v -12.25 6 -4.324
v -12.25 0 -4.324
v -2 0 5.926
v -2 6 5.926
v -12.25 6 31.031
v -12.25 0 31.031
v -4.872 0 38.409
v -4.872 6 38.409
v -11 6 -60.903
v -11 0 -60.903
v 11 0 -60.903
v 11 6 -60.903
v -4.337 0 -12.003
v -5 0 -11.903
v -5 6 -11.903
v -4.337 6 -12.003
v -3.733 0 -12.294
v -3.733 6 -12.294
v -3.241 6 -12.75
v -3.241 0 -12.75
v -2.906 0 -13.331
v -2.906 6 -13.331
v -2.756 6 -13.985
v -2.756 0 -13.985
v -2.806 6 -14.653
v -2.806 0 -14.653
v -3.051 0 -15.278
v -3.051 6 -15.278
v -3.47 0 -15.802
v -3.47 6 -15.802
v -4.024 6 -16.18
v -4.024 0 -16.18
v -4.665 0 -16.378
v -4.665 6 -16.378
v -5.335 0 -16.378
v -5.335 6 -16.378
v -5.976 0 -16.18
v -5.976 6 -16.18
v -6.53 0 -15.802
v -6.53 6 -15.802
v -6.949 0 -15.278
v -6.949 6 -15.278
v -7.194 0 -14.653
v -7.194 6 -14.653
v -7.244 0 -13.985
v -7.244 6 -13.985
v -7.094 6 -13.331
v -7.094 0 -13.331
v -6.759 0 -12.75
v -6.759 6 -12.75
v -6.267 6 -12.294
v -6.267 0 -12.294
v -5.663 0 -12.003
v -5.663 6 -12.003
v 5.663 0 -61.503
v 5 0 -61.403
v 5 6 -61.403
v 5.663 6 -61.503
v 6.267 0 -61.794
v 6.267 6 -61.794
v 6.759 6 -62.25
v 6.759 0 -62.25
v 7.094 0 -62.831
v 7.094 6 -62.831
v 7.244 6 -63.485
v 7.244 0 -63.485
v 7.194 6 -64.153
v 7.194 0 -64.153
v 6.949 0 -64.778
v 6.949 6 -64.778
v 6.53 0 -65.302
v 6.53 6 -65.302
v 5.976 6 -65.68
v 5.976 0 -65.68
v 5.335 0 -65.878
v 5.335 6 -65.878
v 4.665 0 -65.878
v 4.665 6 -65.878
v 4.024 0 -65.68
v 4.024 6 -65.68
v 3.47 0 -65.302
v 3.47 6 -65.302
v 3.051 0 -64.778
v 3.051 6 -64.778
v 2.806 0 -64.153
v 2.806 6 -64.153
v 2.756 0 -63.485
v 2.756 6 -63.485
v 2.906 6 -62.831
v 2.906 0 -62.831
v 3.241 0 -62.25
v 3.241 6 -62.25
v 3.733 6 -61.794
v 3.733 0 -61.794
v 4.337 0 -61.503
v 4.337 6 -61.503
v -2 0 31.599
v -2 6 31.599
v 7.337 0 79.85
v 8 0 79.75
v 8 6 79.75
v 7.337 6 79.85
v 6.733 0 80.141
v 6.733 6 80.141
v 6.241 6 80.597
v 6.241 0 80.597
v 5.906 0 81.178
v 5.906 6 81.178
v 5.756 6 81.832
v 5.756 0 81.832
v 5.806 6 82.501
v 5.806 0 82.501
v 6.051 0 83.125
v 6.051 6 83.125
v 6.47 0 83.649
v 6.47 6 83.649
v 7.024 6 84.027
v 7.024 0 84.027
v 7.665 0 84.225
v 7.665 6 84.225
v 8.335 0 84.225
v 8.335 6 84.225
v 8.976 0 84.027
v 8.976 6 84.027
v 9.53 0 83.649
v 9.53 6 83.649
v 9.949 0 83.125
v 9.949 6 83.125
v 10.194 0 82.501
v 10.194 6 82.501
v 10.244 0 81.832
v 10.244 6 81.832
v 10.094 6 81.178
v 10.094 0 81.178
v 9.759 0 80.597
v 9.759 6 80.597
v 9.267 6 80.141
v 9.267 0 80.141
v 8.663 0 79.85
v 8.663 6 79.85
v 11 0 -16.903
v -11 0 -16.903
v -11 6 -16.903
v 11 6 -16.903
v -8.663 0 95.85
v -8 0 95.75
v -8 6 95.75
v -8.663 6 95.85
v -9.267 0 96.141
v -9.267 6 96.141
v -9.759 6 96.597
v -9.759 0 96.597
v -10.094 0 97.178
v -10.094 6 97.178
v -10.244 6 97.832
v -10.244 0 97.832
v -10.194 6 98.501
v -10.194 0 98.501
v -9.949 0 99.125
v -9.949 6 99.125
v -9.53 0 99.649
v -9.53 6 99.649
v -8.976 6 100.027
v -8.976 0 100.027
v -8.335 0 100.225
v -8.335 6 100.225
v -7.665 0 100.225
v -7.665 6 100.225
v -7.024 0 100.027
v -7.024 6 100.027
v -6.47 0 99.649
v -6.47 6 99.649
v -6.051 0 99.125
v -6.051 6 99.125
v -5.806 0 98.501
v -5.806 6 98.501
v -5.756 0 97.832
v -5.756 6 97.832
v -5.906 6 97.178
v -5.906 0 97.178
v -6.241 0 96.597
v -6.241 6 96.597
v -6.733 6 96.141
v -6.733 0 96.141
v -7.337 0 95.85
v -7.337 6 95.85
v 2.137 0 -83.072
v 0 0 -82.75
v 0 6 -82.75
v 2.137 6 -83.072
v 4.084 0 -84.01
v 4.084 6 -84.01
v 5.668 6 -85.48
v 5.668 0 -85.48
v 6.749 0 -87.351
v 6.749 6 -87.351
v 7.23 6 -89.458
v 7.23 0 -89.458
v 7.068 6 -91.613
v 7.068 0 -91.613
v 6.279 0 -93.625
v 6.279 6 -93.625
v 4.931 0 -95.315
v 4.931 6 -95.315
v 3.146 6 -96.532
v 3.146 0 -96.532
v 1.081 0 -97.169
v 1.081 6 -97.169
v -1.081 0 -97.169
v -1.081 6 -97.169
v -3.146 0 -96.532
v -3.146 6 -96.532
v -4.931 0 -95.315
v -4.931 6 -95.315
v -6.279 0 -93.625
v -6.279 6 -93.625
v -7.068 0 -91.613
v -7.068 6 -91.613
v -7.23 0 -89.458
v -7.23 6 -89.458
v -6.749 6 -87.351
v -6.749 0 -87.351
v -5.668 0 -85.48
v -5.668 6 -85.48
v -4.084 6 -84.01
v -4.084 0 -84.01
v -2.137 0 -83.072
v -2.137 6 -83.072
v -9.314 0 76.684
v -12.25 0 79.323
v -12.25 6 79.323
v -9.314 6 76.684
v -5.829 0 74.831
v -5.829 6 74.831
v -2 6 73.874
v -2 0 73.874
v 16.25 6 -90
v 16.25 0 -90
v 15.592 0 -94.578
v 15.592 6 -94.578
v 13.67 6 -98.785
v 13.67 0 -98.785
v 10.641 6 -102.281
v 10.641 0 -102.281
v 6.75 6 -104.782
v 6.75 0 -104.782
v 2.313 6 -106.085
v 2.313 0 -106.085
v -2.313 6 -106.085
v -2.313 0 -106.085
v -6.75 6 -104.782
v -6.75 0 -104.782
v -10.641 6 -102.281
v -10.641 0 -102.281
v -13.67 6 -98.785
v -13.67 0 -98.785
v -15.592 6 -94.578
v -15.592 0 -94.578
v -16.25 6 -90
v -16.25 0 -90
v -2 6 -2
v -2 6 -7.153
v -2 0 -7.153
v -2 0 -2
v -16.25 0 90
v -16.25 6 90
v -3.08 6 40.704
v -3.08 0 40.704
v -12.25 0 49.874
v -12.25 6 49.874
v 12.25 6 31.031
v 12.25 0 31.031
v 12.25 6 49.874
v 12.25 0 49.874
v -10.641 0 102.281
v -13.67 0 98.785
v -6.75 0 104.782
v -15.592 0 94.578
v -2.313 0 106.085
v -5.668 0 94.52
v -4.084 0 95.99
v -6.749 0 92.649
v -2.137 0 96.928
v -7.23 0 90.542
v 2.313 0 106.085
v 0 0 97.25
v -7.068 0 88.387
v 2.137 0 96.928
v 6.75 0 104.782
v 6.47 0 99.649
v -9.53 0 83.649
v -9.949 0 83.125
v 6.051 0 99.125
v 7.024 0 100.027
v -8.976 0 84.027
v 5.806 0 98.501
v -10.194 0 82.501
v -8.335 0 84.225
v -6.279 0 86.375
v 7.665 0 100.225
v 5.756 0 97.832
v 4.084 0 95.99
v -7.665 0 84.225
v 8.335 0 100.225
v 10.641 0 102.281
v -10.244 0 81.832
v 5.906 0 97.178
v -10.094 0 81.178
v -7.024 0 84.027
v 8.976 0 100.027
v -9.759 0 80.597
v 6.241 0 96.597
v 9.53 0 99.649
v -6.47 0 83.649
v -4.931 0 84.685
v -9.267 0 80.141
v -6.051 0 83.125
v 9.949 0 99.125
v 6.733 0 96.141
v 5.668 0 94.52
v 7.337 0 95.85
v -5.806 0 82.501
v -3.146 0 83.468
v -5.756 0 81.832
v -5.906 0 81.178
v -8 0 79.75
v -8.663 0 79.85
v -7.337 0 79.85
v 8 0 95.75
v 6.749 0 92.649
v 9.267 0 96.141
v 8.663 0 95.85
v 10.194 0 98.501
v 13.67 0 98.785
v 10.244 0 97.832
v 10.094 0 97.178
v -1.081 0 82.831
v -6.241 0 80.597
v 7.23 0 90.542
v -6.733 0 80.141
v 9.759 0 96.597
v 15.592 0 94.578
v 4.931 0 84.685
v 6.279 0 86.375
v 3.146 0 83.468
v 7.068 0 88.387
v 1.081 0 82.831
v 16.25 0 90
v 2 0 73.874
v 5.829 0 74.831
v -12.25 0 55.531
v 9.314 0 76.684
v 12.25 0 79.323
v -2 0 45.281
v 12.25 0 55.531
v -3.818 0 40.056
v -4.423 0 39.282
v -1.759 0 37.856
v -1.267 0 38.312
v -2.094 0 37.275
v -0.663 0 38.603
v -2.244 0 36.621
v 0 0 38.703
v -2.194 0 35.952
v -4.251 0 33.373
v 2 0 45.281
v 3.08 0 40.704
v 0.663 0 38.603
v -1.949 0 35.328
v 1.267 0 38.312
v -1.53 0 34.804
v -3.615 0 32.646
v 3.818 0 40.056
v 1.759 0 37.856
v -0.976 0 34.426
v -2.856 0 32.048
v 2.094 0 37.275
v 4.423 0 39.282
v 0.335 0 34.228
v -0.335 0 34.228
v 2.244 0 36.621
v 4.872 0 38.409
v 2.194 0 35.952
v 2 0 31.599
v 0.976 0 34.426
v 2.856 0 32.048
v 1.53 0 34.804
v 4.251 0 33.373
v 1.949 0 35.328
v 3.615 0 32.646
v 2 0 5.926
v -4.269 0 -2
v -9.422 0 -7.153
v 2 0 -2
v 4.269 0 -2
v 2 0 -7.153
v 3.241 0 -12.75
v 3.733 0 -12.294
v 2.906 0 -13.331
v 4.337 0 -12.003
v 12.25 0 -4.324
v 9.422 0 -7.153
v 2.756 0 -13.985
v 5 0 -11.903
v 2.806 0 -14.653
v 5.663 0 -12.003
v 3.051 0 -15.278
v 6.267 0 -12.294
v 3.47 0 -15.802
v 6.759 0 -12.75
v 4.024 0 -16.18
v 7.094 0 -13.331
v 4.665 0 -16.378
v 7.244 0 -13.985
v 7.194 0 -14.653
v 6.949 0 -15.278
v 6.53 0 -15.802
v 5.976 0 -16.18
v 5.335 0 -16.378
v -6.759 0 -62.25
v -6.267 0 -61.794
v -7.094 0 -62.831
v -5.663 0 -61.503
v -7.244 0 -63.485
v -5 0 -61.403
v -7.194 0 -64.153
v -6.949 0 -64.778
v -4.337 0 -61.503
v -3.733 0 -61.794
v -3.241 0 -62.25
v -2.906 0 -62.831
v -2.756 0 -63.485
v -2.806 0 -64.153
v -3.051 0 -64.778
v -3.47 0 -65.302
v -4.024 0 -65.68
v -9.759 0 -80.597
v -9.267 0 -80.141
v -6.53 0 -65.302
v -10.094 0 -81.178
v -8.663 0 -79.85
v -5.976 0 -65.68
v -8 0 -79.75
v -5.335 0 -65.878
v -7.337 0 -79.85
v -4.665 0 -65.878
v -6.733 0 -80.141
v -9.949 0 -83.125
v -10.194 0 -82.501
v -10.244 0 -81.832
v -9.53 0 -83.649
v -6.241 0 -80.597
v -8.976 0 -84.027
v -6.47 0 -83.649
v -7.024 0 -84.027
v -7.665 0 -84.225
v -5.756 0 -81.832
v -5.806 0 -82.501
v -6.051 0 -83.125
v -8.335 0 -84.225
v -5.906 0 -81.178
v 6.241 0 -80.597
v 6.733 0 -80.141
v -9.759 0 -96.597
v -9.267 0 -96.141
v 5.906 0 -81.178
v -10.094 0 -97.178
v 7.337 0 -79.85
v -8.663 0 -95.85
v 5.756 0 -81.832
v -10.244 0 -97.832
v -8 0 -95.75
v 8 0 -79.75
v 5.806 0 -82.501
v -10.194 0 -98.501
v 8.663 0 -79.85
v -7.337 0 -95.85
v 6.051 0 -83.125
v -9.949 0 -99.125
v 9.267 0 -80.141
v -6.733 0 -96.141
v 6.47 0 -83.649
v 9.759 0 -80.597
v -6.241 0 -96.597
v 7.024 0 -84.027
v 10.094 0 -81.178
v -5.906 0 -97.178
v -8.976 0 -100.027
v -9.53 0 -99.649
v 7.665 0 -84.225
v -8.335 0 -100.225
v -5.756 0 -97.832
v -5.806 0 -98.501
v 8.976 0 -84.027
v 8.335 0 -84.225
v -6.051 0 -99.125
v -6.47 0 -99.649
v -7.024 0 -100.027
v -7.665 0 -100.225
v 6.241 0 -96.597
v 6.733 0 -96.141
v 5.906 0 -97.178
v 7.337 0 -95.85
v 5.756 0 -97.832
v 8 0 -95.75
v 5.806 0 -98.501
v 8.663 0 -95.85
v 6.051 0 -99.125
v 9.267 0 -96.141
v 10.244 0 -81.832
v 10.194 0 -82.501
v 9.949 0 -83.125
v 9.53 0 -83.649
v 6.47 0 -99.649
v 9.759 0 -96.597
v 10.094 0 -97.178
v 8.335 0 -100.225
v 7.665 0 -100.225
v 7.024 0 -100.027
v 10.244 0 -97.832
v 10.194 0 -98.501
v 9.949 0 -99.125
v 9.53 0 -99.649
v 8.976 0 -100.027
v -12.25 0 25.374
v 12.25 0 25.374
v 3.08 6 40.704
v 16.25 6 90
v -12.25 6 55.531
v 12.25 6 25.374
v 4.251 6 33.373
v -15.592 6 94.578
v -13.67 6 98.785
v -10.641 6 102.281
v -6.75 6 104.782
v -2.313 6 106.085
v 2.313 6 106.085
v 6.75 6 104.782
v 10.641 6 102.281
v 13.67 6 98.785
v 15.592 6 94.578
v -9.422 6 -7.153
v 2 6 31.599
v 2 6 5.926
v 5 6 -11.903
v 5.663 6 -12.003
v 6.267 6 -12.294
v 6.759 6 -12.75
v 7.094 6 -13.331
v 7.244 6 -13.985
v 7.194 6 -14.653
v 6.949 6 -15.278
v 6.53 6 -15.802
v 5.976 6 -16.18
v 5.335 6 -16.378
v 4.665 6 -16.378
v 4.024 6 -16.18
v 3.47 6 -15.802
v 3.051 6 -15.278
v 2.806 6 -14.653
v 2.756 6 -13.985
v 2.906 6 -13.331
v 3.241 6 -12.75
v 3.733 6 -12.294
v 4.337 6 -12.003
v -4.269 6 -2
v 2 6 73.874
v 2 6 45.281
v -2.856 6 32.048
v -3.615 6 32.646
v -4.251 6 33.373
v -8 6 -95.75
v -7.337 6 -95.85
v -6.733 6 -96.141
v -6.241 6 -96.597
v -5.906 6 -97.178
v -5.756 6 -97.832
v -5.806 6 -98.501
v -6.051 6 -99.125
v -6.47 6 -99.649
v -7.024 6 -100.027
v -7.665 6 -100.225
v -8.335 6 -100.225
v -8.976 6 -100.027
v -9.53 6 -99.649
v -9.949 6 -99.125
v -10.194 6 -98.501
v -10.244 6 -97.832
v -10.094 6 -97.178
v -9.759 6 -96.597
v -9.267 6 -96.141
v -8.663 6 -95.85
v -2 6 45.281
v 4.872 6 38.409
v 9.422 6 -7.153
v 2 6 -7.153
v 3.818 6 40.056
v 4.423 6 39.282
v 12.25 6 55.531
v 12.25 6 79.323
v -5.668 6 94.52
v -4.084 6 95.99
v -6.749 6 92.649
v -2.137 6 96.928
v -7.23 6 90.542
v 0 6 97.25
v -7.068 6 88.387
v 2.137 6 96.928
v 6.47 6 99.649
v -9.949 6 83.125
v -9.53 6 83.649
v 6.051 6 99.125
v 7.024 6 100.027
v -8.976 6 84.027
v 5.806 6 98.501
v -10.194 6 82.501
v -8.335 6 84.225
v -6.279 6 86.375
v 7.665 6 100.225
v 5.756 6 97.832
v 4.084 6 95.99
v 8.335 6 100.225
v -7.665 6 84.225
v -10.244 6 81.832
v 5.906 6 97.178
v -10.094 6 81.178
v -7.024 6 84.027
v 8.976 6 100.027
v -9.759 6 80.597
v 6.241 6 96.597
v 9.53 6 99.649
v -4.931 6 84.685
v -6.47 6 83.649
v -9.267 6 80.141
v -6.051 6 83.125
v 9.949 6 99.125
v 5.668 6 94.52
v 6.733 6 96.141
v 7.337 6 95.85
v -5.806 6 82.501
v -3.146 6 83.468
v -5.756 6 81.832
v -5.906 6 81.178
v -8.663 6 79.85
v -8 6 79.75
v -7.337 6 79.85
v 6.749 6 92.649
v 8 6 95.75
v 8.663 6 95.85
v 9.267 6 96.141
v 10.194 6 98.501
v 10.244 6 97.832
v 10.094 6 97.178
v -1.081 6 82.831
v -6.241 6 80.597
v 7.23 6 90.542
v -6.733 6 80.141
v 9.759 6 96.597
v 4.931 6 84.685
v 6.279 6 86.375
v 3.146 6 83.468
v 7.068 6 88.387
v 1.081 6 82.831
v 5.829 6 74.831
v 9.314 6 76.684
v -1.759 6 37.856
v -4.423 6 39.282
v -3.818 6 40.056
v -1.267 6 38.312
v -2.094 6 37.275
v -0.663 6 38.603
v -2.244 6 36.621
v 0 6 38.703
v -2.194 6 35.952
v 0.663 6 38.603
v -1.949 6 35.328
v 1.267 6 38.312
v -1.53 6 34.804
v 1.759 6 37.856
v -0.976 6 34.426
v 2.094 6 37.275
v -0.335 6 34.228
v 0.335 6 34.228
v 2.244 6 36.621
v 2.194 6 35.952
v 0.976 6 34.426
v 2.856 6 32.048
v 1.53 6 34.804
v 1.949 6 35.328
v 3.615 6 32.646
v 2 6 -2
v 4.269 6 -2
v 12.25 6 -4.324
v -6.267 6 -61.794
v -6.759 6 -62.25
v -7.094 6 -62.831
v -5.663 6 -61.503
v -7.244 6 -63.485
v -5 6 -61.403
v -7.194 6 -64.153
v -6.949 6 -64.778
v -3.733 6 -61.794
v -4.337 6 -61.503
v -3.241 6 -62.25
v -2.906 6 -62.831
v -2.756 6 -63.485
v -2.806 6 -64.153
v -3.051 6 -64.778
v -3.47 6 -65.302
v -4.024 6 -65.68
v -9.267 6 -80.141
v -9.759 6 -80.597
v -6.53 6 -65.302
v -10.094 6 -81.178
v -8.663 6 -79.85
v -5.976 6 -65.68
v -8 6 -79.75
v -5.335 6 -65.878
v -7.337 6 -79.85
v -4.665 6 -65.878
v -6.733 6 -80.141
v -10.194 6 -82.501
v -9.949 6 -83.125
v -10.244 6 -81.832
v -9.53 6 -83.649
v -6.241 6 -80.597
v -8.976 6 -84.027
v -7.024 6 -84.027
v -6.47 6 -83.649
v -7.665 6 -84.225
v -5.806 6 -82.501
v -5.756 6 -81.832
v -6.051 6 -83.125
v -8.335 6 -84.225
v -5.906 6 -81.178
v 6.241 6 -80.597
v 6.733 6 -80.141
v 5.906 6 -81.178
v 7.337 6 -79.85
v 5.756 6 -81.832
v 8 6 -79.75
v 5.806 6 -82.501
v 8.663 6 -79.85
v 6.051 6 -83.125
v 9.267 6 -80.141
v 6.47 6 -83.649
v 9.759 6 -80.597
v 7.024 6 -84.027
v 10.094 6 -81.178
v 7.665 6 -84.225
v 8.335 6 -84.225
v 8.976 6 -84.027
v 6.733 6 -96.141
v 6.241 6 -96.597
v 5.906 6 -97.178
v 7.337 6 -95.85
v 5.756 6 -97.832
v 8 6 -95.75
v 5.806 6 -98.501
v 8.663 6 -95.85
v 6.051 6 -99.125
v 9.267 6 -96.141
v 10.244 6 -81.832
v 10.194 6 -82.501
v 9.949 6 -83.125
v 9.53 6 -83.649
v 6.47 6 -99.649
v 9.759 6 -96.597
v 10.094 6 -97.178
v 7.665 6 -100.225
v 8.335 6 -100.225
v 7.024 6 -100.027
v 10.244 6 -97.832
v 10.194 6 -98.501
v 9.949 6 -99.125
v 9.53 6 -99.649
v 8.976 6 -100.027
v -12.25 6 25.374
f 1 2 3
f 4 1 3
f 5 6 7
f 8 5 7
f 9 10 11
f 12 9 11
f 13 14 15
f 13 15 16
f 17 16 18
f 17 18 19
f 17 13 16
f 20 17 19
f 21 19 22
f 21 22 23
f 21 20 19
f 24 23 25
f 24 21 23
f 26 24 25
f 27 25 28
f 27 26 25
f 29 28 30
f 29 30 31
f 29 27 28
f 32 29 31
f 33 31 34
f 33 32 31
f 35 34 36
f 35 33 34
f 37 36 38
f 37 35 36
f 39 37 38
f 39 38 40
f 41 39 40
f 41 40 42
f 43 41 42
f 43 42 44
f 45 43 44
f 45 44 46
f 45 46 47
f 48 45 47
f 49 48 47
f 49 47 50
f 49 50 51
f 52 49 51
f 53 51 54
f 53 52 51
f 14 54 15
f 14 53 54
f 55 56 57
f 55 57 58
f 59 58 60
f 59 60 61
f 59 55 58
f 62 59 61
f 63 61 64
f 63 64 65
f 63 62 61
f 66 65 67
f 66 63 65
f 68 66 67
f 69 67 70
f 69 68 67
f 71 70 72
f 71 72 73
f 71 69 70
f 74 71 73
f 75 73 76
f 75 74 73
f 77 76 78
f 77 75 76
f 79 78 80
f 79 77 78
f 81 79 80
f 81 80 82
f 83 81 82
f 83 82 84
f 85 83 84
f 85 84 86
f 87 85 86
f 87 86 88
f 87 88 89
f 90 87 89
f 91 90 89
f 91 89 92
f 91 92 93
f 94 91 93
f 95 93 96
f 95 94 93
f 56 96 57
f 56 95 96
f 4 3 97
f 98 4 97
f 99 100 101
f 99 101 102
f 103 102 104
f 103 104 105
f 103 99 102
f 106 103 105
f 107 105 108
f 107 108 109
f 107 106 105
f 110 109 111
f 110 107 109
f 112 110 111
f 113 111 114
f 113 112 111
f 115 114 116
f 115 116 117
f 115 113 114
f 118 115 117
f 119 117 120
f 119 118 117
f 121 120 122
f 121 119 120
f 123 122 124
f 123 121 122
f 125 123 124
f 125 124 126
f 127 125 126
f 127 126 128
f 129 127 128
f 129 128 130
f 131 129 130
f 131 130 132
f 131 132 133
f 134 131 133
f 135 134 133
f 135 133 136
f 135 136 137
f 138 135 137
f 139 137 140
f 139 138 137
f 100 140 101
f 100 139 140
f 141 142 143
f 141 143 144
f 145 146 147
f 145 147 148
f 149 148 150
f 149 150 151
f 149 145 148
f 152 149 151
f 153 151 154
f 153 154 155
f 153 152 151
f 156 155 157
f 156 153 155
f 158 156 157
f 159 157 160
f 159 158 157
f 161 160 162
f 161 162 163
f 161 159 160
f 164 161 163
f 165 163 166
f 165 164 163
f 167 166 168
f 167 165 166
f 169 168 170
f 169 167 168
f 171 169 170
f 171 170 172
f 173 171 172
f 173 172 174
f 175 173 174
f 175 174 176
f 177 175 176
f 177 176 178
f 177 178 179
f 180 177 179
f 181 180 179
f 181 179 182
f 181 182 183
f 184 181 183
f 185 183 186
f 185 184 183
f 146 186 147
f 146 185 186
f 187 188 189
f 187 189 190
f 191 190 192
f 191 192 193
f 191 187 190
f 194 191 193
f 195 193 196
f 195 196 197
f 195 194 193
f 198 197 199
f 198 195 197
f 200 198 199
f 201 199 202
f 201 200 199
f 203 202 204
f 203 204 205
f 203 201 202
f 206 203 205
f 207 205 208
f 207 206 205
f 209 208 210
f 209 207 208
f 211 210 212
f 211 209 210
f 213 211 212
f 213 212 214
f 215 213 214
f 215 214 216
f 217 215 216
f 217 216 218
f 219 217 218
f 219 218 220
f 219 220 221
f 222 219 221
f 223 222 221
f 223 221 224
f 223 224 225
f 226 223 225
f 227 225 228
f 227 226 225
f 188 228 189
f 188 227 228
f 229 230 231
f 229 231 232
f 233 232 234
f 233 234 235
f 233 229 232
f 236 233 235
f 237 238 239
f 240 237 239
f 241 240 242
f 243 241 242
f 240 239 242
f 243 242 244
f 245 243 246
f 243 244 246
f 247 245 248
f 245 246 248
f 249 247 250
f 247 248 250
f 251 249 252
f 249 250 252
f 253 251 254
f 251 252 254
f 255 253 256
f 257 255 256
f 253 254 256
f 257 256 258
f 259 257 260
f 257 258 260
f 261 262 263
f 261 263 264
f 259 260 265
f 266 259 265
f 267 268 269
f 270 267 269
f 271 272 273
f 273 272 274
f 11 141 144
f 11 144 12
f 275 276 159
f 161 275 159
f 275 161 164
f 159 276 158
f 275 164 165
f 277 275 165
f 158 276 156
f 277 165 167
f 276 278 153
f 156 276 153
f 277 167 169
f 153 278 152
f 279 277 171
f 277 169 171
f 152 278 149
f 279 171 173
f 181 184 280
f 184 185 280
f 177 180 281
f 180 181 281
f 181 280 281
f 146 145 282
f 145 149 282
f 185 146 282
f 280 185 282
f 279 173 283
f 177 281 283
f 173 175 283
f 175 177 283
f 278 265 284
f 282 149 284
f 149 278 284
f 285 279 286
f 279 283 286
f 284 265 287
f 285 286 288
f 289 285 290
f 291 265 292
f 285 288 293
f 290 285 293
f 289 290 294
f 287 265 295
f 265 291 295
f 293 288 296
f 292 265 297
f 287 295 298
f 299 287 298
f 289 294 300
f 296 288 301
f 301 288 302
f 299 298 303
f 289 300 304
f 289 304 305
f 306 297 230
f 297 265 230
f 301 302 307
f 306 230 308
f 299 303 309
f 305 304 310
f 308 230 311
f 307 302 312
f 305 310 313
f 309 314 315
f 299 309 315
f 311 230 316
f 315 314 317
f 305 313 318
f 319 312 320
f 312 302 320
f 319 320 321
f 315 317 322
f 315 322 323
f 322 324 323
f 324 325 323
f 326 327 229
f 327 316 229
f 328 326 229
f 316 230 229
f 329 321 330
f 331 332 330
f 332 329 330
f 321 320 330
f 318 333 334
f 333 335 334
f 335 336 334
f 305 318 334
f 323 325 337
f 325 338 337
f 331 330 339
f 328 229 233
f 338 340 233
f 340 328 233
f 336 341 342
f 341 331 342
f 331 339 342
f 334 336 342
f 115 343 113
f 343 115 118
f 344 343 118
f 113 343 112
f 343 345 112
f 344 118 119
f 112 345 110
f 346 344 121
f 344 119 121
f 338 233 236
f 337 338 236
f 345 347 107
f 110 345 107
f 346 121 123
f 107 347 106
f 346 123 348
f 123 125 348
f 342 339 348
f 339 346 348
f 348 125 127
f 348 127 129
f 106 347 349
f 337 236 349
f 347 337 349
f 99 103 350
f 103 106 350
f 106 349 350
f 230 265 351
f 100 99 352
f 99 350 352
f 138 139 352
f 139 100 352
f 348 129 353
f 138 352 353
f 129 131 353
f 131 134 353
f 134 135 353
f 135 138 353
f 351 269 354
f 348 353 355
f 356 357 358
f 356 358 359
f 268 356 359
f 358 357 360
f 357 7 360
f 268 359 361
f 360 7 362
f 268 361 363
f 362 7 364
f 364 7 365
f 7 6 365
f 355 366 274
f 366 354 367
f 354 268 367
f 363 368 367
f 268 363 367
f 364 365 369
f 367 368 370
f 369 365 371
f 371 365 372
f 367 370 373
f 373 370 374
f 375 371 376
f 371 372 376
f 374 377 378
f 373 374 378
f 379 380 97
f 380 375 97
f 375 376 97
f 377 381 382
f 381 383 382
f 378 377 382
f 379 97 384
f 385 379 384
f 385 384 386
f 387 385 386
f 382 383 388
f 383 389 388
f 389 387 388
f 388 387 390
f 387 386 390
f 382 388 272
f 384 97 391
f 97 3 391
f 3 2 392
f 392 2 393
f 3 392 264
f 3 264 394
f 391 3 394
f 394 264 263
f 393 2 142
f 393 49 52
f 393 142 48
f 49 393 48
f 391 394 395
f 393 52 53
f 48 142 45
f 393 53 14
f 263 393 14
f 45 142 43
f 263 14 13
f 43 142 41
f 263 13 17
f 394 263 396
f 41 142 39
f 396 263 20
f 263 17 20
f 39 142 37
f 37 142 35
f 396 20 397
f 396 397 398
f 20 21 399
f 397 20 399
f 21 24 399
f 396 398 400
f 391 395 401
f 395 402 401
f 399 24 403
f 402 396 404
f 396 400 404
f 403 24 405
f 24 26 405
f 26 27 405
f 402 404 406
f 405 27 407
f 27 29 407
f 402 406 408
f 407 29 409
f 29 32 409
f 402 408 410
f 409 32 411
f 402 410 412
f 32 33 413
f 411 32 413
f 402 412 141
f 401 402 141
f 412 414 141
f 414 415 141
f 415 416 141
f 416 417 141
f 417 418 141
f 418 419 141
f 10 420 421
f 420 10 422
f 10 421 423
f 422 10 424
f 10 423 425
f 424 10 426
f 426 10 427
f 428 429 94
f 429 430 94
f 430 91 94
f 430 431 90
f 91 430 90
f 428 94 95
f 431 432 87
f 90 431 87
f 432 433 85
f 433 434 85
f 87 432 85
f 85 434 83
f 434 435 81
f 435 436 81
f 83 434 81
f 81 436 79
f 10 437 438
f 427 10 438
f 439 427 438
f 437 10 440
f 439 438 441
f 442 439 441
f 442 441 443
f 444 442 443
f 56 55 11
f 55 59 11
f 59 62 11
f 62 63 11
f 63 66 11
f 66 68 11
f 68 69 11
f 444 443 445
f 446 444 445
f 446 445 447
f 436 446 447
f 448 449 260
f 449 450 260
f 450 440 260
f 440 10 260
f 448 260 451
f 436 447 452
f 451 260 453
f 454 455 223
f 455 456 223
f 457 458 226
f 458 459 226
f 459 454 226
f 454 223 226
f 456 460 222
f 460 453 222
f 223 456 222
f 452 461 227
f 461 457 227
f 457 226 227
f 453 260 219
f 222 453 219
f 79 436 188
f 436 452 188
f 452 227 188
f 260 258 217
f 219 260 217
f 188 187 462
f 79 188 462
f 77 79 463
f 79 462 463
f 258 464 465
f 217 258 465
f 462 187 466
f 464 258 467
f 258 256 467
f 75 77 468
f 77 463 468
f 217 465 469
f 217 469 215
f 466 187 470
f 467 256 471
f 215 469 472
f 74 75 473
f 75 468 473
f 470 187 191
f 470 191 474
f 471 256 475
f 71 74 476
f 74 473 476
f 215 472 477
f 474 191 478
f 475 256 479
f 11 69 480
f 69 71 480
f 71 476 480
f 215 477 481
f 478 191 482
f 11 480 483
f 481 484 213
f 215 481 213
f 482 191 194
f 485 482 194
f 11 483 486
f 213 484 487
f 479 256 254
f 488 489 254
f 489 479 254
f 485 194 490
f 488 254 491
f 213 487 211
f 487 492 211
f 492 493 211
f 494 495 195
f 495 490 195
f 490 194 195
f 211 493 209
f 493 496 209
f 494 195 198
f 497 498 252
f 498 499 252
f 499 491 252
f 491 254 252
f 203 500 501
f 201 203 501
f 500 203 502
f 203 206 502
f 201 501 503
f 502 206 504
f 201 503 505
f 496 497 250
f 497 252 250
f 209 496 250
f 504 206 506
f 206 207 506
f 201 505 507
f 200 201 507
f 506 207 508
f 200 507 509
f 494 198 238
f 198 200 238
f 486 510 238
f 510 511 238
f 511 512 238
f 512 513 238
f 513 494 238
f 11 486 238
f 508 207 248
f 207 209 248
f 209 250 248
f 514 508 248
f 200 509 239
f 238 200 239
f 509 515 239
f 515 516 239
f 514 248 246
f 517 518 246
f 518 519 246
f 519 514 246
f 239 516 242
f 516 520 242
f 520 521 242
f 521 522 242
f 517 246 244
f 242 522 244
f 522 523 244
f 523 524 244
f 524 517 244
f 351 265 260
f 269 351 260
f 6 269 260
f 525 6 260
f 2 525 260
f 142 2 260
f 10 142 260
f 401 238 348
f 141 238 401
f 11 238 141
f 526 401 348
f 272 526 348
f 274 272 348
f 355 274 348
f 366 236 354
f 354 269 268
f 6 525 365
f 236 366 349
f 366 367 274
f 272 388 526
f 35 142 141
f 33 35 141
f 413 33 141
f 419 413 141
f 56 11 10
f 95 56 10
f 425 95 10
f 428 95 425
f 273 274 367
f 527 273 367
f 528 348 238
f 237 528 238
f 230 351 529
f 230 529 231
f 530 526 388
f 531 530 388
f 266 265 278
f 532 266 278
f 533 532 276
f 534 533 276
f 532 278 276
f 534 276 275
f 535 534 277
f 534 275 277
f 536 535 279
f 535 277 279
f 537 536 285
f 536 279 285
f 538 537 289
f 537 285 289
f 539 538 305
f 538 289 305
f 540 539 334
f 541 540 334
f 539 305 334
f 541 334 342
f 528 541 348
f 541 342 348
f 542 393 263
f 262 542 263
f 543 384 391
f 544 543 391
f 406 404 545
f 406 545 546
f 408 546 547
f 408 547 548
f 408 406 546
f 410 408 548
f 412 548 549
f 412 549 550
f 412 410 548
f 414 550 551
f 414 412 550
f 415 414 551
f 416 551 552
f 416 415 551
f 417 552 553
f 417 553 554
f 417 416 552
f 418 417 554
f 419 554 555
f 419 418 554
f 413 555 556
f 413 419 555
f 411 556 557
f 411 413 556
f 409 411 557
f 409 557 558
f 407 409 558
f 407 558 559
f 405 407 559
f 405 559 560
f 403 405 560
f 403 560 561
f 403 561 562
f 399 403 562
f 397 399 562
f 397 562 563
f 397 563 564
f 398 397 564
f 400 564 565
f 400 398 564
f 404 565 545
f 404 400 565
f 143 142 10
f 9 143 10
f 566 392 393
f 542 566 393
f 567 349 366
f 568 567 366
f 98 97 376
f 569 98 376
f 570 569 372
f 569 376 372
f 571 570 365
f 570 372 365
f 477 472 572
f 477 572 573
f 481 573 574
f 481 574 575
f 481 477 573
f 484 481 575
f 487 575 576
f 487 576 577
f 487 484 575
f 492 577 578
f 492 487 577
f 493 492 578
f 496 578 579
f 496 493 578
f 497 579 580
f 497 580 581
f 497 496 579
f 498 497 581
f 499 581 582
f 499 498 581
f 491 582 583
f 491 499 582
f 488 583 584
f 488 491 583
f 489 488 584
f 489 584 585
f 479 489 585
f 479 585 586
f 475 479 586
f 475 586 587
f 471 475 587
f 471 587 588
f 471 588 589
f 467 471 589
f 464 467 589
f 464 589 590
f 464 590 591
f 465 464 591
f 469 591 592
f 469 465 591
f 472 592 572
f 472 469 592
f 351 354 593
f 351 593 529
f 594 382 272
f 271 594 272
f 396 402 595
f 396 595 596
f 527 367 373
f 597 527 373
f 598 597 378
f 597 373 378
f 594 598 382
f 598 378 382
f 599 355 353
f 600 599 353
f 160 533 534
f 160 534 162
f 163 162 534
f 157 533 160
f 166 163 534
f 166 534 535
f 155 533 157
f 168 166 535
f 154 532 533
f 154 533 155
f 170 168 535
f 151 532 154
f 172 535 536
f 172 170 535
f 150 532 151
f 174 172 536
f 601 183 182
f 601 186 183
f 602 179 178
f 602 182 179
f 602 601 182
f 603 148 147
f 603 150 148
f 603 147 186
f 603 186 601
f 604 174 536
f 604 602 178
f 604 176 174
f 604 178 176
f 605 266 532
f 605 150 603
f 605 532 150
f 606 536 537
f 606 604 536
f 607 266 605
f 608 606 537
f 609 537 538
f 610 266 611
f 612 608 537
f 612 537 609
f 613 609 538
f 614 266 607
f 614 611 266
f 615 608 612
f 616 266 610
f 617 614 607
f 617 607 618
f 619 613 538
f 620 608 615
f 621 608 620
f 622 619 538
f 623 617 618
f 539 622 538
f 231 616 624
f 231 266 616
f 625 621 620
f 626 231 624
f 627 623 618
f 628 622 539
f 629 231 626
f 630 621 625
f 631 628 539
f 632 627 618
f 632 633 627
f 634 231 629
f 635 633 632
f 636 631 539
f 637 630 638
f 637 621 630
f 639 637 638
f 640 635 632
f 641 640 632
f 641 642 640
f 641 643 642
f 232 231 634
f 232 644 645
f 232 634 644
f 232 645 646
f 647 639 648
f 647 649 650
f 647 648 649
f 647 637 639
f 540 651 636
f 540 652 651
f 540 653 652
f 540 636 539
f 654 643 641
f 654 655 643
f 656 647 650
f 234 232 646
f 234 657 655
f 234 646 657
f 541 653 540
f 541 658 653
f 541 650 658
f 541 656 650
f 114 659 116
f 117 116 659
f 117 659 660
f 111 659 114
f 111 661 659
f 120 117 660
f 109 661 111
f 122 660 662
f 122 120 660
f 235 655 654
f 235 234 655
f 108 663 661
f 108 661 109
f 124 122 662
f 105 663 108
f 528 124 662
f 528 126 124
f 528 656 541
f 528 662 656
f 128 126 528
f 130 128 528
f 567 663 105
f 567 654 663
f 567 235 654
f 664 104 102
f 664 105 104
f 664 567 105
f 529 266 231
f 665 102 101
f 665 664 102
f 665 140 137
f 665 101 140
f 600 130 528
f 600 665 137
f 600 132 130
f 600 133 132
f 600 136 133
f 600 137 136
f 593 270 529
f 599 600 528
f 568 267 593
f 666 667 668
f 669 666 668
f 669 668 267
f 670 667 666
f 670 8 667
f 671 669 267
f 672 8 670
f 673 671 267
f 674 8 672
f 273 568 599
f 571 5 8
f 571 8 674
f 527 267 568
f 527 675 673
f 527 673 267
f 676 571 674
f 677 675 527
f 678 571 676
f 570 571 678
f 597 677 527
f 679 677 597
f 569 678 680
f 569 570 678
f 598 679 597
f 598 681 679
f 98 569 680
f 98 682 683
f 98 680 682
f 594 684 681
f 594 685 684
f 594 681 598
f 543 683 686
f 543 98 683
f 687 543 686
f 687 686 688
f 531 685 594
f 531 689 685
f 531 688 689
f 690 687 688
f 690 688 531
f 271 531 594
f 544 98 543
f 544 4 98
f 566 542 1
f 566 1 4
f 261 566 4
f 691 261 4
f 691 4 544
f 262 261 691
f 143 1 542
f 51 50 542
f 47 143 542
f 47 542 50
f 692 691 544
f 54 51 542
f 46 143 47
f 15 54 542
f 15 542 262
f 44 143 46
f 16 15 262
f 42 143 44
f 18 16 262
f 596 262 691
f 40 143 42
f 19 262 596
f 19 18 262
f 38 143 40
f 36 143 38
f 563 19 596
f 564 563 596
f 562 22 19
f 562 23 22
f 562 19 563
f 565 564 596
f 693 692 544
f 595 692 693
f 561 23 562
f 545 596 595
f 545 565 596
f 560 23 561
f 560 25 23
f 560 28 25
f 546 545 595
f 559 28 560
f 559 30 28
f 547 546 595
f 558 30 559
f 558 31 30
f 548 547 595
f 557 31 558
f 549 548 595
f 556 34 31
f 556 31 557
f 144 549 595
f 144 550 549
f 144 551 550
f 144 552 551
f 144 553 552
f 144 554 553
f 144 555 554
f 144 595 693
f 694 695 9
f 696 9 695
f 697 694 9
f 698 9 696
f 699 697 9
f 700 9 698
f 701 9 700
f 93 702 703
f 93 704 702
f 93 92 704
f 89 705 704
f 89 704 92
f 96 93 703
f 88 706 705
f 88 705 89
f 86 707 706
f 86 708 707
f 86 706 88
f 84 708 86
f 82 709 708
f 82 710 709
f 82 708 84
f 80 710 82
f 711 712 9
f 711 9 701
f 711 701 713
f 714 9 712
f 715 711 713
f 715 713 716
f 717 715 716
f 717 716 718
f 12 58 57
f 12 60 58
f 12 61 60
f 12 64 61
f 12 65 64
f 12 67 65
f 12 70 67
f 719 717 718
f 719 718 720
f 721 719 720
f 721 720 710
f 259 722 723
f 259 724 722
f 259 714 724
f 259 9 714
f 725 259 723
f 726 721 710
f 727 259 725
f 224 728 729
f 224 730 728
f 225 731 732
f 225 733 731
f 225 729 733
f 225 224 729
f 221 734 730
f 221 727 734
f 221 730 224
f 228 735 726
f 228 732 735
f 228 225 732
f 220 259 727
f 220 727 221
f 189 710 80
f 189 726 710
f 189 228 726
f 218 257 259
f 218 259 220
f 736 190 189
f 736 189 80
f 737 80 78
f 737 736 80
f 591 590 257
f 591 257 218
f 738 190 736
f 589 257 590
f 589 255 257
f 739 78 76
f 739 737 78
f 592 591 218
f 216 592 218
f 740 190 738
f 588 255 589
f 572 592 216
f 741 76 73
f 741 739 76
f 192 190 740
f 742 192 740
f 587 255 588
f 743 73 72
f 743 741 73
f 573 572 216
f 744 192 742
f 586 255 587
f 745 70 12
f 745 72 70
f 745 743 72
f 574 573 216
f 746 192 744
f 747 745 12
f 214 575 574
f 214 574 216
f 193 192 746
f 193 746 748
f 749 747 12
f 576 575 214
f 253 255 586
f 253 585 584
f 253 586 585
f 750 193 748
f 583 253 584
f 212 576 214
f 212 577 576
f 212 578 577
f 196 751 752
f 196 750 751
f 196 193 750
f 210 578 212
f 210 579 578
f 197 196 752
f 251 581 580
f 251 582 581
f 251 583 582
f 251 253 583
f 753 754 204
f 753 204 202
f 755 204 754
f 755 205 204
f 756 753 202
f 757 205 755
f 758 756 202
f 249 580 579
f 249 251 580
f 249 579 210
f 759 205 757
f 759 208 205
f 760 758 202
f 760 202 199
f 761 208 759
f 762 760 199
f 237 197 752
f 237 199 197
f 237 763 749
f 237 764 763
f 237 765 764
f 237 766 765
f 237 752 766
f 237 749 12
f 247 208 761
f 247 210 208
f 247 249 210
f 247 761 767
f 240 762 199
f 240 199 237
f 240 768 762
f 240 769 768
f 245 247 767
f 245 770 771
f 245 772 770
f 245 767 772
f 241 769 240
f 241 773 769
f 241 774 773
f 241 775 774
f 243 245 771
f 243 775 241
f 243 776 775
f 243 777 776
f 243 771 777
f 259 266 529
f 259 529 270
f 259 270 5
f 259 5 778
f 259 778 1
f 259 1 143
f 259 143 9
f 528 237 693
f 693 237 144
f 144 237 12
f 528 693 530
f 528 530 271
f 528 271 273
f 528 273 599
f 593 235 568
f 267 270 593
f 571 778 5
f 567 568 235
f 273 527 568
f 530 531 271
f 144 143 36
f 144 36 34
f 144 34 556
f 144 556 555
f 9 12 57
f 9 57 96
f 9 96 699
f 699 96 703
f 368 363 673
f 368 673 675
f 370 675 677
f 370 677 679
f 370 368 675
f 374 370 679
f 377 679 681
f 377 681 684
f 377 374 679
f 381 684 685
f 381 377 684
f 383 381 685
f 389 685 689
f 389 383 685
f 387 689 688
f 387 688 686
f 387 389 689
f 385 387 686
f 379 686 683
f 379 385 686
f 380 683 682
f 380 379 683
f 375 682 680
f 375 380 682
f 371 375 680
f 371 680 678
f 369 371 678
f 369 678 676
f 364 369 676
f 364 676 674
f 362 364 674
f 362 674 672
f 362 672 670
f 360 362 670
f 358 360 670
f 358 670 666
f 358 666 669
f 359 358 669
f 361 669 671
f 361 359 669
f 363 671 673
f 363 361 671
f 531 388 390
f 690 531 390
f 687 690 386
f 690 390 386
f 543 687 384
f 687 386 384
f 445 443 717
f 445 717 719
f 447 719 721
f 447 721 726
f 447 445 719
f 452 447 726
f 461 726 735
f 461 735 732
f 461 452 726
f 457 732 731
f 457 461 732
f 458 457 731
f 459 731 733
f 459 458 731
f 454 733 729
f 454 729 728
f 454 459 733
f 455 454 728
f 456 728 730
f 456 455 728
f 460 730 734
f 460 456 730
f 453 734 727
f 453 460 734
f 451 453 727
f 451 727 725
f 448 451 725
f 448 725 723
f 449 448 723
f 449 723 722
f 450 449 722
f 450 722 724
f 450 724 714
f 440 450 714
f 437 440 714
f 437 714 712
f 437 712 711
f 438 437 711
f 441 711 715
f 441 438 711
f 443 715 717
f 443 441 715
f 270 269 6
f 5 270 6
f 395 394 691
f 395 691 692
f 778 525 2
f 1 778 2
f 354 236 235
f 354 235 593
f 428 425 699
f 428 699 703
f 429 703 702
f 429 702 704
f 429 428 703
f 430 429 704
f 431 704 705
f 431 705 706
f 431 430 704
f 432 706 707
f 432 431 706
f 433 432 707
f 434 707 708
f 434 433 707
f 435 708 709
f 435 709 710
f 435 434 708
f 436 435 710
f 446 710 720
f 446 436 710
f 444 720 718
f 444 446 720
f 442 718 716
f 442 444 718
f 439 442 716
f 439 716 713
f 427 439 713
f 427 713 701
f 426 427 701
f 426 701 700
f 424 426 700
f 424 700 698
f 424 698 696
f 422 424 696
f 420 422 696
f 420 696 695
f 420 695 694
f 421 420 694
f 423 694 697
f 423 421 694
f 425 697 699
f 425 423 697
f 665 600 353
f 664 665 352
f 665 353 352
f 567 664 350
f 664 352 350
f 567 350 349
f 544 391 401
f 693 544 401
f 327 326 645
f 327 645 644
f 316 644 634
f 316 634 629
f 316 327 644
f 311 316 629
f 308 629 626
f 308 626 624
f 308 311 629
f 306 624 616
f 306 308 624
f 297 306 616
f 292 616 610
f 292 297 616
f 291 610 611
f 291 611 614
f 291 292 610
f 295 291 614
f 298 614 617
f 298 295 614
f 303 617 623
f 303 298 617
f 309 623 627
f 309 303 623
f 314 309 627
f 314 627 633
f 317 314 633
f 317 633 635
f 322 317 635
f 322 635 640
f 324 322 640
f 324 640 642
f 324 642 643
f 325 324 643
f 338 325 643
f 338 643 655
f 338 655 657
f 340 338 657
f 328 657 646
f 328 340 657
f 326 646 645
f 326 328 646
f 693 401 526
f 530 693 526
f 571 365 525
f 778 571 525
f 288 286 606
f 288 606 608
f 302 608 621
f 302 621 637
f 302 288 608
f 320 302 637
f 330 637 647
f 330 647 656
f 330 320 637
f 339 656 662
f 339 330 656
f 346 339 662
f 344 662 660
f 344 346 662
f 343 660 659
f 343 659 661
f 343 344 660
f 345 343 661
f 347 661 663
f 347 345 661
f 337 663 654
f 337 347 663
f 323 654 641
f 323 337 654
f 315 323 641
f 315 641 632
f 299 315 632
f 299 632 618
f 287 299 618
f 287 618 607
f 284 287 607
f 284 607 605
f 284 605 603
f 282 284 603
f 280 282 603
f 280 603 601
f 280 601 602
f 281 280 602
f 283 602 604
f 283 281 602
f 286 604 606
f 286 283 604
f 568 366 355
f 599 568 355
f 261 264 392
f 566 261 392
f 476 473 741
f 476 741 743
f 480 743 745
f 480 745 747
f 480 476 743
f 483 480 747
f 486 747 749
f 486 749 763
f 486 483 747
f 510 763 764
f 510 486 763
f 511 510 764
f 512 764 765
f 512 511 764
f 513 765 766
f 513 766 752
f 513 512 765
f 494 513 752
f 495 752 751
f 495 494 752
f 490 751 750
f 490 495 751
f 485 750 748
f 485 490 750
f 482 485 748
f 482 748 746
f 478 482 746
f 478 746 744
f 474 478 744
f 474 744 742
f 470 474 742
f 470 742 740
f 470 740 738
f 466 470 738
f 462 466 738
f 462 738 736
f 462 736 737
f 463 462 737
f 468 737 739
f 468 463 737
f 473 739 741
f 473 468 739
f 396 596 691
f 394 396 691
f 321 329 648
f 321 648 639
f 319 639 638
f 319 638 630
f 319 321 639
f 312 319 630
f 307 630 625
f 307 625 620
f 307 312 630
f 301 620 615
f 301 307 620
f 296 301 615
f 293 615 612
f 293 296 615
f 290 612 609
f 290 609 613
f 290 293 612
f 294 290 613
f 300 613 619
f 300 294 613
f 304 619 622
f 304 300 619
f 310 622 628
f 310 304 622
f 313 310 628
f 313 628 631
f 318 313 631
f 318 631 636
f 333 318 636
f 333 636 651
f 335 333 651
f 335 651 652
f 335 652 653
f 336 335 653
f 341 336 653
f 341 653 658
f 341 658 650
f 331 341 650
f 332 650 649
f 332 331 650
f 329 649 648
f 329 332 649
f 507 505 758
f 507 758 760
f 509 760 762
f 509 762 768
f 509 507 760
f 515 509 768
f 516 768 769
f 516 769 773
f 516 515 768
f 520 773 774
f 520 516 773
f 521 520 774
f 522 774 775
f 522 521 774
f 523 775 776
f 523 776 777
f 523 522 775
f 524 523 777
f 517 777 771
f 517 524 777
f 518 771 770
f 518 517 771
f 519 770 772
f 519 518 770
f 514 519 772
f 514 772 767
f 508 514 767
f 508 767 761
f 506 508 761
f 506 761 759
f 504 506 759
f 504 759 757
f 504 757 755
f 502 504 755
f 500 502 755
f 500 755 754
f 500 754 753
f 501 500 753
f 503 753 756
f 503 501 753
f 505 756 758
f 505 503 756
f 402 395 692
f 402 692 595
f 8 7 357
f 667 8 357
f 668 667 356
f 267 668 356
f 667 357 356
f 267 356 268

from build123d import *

# Parameters (mm, degrees)
SKETCH2_R           = 7.25
SKETCH2_R_2         = 2.25
SKETCH2_W           = 22
SKETCH2_H           = 44
BOSS_EXTRUDE1_DEPTH = 6
CUT_EXTRUDE1_START  = -26
CUT_EXTRUDE1_DEPTH  = 26


with BuildPart() as part:
    # Sketch2 → Boss-Extrude1 (new body)
    with BuildSketch(Plane(origin=(0, 0, 0), x_dir=(1, 0, 0), z_dir=(0, 1, 0))):
        with BuildLine():
            Line((-16.25, 90), (-16.25, -90))
            ThreePointArc((-16.25, -90), (0, -106.25), (16.25, -90))
            Line((16.25, -90), (16.25, 90))
            ThreePointArc((16.25, 90), (0, 106.25), (-16.25, 90))
        make_face()
        with Locations(Location((0, 90, 0), (0, 0, 270))):
            Circle(SKETCH2_R, mode=Mode.SUBTRACT)
        with Locations(Location((0, -90, 0), (0, 0, 270))):
            Circle(SKETCH2_R, mode=Mode.SUBTRACT)
        with Locations(Location((8, 98, 0), (0, 0, 270))):
            Circle(SKETCH2_R_2, mode=Mode.SUBTRACT)
        with Locations(Location((-8, 98, 0), (0, 0, 270))):
            Circle(SKETCH2_R_2, mode=Mode.SUBTRACT)
        with Locations(Location((-8, 82, 0), (0, 0, 270))):
            Circle(SKETCH2_R_2, mode=Mode.SUBTRACT)
        with Locations(Location((8, 82, 0), (0, 0, 270))):
            Circle(SKETCH2_R_2, mode=Mode.SUBTRACT)
        with Locations(Location((8, -98, 0), (0, 0, 90))):
            Circle(SKETCH2_R_2, mode=Mode.SUBTRACT)
        with Locations(Location((8, -82, 0), (0, 0, 90))):
            Circle(SKETCH2_R_2, mode=Mode.SUBTRACT)
        with Locations(Location((-8, -82, 0), (0, 0, 90))):
            Circle(SKETCH2_R_2, mode=Mode.SUBTRACT)
        with Locations(Location((-8, -98, 0), (0, 0, 90))):
            Circle(SKETCH2_R_2, mode=Mode.SUBTRACT)
        with Locations(Location((-5, 63.652785483, 0), (0, 0, 270))):
            Circle(SKETCH2_R_2, mode=Mode.SUBTRACT)
        with Locations(Location((5, 63.652785483, 0), (0, 0, 270))):
            Circle(SKETCH2_R_2, mode=Mode.SUBTRACT)
        with Locations(Location((-5, 14.152785483, 0), (0, 0, 270))):
            Circle(SKETCH2_R_2, mode=Mode.SUBTRACT)
        with Locations(Location((5, 14.152785483, 0), (0, 0, 270))):
            Circle(SKETCH2_R_2, mode=Mode.SUBTRACT)
        with Locations(Location((0, -36.453, 0), (0, 0, 270))):
            Circle(SKETCH2_R_2, mode=Mode.SUBTRACT)
        with Locations((0, 38.902785483)):
            Rectangle(SKETCH2_W, SKETCH2_H, mode=Mode.SUBTRACT)
    extrude(amount=BOSS_EXTRUDE1_DEPTH)

    # Sketch3 → Cut-Extrude1 (cut)
    with BuildSketch(Plane(origin=(0, 6, 0), x_dir=(1, 0, 0), z_dir=(0, 1, 0)).offset(CUT_EXTRUDE1_START)):
        with BuildLine():
            ThreePointArc((-2, -31.59887804), (-3.249097876, -32.329183443), (-4.25140088, -33.372725571))
            Line((-4.25140088, -33.372725571), (-12.25, -25.374126452))
            Line((-12.25, -25.374126452), (-12.25, 4.324358358))
            Line((-12.25, 4.324358358), (-2, -5.925641642))
            Line((-2, -5.925641642), (-2, -31.59887804))
        make_face()
        with BuildLine():
            ThreePointArc((4.25140088, -33.372725571), (3.249097876, -32.329183443), (2, -31.59887804))
            Line((2, -31.59887804), (2, -5.925641642))
            Line((2, -5.925641642), (12.25, 4.324358358))
            Line((12.25, 4.324358358), (12.25, -25.374126452))
            Line((12.25, -25.374126452), (4.25140088, -33.372725571))
        make_face()
        with BuildLine():
            ThreePointArc((-4.872043809, -38.408936892), (-4.138493695, -39.68338232), (-3.080274429, -40.70440088))
            Line((-3.080274429, -40.70440088), (-12.25, -49.874126451))
            Line((-12.25, -49.874126451), (-12.25, -31.030980701))
            Line((-12.25, -31.030980701), (-4.872043809, -38.408936892))
        make_face()
        with BuildLine():
            ThreePointArc((3.080274429, -40.70440088), (4.138493696, -39.68338232), (4.872043809, -38.408936892))
            Line((4.872043809, -38.408936892), (12.25, -31.030980701))
            Line((12.25, -31.030980701), (12.25, -49.874126451))
            Line((12.25, -49.874126451), (3.080274429, -40.70440088))
        make_face()
        with BuildLine():
            Line((-12.25, -55.530980701), (-12.25, -79.322921748))
            ThreePointArc((-12.25, -79.322921748), (-7.628207354, -75.651726495), (-2, -73.873546577))
            Line((-2, -73.873546577), (-2, -45.280980701))
            Line((-2, -45.280980701), (-12.25, -55.530980701))
        make_face()
        with BuildLine():
            ThreePointArc((12.25, -79.322921748), (7.628207354, -75.651726495), (2, -73.873546577))
            Line((2, -73.873546577), (2, -45.280980701))
            Line((2, -45.280980701), (12.25, -55.530980701))
            Line((12.25, -55.530980701), (12.25, -79.322921748))
        make_face()
        Polygon((-4.268787392, 2), (-9.421572875, 7.152785483), (-2, 7.152785483), (-2, 2), align=None)
        Polygon((2, 2), (4.268787392, 2), (9.421572875, 7.152785483), (2, 7.152785483), align=None)
    extrude(amount=CUT_EXTRUDE1_DEPTH, mode=Mode.SUBTRACT)


solid = part.part
